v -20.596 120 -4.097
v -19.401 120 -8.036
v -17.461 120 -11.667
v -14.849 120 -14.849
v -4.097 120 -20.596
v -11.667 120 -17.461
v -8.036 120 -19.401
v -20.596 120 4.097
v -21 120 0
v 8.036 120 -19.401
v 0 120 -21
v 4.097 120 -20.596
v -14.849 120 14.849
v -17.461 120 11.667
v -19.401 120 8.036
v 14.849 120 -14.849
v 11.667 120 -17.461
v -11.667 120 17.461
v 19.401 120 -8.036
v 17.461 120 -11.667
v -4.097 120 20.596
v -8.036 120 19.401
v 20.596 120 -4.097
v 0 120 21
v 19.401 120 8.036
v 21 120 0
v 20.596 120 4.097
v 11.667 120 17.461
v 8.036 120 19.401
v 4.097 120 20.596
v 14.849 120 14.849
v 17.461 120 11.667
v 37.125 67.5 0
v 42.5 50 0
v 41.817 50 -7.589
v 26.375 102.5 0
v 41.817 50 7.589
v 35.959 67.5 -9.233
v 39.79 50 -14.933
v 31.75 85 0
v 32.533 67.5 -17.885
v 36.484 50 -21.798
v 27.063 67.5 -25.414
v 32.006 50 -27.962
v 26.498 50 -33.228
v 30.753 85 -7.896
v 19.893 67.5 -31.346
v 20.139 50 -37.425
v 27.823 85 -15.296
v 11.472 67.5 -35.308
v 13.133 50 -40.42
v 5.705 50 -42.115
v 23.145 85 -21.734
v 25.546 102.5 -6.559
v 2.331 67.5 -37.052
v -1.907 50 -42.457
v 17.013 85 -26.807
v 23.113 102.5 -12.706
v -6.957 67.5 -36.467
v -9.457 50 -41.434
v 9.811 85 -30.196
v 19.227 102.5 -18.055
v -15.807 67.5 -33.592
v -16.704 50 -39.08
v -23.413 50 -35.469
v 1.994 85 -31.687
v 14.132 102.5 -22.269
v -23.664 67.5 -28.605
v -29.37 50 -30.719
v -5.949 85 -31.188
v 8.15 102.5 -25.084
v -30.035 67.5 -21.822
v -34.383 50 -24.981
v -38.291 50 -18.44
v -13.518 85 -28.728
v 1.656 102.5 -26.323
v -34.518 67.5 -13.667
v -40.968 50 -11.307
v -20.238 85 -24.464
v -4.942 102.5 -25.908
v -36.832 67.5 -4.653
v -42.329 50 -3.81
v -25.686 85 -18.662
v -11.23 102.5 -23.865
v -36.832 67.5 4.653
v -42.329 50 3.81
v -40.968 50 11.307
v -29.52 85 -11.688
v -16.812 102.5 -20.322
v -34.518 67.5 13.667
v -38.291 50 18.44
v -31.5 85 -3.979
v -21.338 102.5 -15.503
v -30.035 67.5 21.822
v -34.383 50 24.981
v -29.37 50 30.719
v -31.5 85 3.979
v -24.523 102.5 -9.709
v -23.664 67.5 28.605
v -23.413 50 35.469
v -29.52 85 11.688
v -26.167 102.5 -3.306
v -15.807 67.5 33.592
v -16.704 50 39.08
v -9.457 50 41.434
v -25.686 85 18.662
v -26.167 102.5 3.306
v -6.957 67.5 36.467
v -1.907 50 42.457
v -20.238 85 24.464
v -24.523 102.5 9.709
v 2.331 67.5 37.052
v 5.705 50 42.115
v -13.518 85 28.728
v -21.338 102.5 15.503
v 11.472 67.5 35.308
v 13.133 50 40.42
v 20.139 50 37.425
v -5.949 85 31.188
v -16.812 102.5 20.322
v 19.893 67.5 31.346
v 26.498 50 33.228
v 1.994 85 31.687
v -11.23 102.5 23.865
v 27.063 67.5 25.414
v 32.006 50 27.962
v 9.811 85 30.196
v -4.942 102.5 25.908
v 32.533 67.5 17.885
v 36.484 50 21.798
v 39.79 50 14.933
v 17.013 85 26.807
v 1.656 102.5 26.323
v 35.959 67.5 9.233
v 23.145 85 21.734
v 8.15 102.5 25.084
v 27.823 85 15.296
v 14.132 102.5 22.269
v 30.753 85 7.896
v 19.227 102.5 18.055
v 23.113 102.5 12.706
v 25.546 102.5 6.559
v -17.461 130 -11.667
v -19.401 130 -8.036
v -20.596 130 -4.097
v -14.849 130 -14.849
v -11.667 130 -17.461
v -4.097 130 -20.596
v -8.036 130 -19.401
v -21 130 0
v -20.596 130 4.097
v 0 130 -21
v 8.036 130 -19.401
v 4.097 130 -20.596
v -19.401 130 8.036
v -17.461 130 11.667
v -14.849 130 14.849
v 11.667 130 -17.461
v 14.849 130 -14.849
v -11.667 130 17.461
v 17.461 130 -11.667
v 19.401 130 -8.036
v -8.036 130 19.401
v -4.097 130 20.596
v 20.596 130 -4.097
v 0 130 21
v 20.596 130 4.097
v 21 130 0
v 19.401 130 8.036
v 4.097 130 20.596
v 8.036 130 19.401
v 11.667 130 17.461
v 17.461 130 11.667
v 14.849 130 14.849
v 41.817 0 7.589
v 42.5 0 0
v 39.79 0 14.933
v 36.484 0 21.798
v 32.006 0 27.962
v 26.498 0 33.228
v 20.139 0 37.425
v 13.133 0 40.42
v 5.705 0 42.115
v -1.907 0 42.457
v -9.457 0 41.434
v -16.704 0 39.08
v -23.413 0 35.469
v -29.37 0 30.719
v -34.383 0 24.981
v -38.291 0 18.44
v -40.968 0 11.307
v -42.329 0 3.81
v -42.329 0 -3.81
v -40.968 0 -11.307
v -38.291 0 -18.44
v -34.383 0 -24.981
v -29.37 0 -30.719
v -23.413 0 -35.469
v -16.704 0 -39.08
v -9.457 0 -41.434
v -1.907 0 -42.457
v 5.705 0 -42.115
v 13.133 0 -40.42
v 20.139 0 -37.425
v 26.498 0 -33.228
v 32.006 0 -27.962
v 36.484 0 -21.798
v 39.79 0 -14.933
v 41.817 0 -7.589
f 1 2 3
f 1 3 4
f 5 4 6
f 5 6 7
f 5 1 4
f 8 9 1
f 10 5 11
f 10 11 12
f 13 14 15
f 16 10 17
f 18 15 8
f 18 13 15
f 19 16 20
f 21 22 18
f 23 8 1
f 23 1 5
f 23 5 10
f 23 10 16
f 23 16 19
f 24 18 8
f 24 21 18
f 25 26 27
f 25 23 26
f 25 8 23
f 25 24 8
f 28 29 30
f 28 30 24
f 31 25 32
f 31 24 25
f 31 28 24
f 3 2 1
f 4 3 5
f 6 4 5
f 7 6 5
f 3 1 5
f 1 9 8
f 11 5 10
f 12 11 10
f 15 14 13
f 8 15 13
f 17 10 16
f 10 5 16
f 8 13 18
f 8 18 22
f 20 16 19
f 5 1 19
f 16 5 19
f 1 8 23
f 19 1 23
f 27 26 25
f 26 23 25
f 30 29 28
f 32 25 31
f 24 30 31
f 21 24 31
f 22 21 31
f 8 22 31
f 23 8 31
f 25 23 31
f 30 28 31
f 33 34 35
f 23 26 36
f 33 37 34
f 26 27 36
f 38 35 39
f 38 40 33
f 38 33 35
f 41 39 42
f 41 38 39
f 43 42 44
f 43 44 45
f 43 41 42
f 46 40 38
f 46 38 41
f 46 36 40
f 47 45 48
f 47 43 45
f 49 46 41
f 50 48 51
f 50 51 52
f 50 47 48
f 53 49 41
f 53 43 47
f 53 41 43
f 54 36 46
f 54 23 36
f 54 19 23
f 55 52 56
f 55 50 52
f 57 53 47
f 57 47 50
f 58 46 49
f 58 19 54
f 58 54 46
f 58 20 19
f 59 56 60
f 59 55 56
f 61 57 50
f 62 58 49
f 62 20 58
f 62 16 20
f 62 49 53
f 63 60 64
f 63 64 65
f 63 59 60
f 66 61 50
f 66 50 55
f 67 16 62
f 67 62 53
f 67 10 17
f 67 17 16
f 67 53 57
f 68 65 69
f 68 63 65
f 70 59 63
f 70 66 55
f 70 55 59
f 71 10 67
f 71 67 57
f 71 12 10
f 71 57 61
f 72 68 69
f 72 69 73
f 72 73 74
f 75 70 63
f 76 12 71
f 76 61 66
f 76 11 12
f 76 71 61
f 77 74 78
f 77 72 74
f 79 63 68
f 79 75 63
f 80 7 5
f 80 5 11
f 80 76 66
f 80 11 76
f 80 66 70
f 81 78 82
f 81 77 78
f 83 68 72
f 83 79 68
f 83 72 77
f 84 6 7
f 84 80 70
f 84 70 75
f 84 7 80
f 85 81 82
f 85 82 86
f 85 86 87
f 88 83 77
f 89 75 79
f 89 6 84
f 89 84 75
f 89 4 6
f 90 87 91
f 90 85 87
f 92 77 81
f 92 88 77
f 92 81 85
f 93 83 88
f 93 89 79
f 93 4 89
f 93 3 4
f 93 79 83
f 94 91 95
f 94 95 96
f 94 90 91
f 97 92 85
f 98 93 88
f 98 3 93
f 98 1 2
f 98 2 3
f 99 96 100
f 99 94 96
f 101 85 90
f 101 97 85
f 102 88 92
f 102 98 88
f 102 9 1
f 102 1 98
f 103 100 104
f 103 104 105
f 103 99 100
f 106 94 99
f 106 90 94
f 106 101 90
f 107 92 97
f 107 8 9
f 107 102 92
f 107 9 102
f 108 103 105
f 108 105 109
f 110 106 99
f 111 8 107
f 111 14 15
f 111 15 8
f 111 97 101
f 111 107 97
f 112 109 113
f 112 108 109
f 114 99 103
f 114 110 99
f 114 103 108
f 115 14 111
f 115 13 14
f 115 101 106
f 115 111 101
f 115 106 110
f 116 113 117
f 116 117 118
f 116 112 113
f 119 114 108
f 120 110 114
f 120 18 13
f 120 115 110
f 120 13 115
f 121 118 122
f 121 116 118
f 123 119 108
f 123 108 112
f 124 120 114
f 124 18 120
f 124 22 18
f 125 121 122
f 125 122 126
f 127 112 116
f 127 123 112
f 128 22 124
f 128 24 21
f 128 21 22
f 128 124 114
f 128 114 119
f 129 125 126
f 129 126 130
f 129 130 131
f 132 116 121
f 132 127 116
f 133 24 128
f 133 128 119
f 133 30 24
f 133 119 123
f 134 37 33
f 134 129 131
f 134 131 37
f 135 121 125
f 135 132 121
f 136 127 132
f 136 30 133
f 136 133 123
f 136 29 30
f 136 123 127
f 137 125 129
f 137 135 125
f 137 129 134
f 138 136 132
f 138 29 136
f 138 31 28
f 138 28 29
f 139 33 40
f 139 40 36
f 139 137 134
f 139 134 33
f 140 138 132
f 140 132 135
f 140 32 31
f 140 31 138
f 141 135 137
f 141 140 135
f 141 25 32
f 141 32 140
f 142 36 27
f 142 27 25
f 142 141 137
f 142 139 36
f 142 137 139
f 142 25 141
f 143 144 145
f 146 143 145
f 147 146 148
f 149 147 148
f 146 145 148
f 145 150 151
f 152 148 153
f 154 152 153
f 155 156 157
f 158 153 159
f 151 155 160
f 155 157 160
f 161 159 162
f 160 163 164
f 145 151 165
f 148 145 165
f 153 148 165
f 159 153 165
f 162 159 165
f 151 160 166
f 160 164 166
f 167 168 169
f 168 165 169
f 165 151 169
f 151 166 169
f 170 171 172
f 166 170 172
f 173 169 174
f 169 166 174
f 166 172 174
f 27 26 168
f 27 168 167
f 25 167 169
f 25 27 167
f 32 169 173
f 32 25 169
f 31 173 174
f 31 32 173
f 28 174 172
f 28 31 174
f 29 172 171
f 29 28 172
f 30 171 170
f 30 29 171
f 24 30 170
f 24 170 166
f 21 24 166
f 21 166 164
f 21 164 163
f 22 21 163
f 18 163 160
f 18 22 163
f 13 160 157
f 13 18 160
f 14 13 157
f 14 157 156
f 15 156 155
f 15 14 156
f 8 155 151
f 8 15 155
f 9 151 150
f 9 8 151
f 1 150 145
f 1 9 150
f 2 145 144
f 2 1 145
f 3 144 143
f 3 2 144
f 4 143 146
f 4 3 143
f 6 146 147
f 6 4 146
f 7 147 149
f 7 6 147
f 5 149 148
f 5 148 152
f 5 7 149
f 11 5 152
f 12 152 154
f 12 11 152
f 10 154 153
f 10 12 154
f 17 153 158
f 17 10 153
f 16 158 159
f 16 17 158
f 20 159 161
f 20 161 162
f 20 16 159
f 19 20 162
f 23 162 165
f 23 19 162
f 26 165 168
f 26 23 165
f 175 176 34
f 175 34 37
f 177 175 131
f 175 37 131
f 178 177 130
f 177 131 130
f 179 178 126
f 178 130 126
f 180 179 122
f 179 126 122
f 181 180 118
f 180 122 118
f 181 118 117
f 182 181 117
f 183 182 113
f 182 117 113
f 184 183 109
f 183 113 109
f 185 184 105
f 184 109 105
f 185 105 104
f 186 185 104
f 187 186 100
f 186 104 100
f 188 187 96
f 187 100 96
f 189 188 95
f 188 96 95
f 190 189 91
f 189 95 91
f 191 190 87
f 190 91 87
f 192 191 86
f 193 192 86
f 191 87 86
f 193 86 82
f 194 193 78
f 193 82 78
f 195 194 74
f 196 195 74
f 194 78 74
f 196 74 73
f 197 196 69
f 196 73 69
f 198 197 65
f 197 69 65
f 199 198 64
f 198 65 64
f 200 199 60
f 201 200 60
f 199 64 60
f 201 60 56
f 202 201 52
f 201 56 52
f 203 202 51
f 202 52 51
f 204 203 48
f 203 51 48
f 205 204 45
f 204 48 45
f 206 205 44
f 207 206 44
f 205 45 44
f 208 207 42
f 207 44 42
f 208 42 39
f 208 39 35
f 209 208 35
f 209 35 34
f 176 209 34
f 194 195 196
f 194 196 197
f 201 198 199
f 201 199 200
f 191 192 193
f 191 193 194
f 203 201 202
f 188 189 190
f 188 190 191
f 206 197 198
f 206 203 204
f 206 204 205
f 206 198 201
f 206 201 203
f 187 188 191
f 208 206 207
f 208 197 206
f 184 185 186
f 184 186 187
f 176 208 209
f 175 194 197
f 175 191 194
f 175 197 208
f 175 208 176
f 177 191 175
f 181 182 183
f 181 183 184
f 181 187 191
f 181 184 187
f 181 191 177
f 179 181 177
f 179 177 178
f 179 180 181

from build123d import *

# Parameters (mm, degrees)
F2_R      = 21
F3_DEPTH  = 10
F0_R      = 42.5
F4_DEPTH  = 50
F4_FACE_R = 42.5
F3_FACE_R = 21
F5_FACE_R = 42.5
F7_DEPTH  = 50


with BuildPart() as f3:
    # F2 (on offset) → F3 (new body)
    with BuildSketch(Plane.XZ.offset(-120)):
        Circle(F2_R)
    extrude(amount=-F3_DEPTH)


with BuildPart() as f4:
    # F0 (on Front) → F4 (new body)
    with BuildSketch(Plane.XZ):
        Circle(F0_R)
    extrude(amount=-F4_DEPTH)


with BuildPart() as f5:
    # F4_face (on face) → F5 section 0
    with BuildSketch(Plane(origin=(0, 50, 0), x_dir=(1, 0, 0), z_dir=(0, 1, 0))):
        Circle(F4_FACE_R)
    # F3_face (on face) → F5 section 1
    with BuildSketch(Plane.XZ.offset(-120)):
        Circle(F3_FACE_R)
    loft()

    # F5_face (on face) → F7 (join)
    with BuildSketch(Plane.XZ.offset(-50)):
        Circle(F5_FACE_R)
    extrude(amount=F7_DEPTH)


solid = Compound([f3.part, f5.part])
